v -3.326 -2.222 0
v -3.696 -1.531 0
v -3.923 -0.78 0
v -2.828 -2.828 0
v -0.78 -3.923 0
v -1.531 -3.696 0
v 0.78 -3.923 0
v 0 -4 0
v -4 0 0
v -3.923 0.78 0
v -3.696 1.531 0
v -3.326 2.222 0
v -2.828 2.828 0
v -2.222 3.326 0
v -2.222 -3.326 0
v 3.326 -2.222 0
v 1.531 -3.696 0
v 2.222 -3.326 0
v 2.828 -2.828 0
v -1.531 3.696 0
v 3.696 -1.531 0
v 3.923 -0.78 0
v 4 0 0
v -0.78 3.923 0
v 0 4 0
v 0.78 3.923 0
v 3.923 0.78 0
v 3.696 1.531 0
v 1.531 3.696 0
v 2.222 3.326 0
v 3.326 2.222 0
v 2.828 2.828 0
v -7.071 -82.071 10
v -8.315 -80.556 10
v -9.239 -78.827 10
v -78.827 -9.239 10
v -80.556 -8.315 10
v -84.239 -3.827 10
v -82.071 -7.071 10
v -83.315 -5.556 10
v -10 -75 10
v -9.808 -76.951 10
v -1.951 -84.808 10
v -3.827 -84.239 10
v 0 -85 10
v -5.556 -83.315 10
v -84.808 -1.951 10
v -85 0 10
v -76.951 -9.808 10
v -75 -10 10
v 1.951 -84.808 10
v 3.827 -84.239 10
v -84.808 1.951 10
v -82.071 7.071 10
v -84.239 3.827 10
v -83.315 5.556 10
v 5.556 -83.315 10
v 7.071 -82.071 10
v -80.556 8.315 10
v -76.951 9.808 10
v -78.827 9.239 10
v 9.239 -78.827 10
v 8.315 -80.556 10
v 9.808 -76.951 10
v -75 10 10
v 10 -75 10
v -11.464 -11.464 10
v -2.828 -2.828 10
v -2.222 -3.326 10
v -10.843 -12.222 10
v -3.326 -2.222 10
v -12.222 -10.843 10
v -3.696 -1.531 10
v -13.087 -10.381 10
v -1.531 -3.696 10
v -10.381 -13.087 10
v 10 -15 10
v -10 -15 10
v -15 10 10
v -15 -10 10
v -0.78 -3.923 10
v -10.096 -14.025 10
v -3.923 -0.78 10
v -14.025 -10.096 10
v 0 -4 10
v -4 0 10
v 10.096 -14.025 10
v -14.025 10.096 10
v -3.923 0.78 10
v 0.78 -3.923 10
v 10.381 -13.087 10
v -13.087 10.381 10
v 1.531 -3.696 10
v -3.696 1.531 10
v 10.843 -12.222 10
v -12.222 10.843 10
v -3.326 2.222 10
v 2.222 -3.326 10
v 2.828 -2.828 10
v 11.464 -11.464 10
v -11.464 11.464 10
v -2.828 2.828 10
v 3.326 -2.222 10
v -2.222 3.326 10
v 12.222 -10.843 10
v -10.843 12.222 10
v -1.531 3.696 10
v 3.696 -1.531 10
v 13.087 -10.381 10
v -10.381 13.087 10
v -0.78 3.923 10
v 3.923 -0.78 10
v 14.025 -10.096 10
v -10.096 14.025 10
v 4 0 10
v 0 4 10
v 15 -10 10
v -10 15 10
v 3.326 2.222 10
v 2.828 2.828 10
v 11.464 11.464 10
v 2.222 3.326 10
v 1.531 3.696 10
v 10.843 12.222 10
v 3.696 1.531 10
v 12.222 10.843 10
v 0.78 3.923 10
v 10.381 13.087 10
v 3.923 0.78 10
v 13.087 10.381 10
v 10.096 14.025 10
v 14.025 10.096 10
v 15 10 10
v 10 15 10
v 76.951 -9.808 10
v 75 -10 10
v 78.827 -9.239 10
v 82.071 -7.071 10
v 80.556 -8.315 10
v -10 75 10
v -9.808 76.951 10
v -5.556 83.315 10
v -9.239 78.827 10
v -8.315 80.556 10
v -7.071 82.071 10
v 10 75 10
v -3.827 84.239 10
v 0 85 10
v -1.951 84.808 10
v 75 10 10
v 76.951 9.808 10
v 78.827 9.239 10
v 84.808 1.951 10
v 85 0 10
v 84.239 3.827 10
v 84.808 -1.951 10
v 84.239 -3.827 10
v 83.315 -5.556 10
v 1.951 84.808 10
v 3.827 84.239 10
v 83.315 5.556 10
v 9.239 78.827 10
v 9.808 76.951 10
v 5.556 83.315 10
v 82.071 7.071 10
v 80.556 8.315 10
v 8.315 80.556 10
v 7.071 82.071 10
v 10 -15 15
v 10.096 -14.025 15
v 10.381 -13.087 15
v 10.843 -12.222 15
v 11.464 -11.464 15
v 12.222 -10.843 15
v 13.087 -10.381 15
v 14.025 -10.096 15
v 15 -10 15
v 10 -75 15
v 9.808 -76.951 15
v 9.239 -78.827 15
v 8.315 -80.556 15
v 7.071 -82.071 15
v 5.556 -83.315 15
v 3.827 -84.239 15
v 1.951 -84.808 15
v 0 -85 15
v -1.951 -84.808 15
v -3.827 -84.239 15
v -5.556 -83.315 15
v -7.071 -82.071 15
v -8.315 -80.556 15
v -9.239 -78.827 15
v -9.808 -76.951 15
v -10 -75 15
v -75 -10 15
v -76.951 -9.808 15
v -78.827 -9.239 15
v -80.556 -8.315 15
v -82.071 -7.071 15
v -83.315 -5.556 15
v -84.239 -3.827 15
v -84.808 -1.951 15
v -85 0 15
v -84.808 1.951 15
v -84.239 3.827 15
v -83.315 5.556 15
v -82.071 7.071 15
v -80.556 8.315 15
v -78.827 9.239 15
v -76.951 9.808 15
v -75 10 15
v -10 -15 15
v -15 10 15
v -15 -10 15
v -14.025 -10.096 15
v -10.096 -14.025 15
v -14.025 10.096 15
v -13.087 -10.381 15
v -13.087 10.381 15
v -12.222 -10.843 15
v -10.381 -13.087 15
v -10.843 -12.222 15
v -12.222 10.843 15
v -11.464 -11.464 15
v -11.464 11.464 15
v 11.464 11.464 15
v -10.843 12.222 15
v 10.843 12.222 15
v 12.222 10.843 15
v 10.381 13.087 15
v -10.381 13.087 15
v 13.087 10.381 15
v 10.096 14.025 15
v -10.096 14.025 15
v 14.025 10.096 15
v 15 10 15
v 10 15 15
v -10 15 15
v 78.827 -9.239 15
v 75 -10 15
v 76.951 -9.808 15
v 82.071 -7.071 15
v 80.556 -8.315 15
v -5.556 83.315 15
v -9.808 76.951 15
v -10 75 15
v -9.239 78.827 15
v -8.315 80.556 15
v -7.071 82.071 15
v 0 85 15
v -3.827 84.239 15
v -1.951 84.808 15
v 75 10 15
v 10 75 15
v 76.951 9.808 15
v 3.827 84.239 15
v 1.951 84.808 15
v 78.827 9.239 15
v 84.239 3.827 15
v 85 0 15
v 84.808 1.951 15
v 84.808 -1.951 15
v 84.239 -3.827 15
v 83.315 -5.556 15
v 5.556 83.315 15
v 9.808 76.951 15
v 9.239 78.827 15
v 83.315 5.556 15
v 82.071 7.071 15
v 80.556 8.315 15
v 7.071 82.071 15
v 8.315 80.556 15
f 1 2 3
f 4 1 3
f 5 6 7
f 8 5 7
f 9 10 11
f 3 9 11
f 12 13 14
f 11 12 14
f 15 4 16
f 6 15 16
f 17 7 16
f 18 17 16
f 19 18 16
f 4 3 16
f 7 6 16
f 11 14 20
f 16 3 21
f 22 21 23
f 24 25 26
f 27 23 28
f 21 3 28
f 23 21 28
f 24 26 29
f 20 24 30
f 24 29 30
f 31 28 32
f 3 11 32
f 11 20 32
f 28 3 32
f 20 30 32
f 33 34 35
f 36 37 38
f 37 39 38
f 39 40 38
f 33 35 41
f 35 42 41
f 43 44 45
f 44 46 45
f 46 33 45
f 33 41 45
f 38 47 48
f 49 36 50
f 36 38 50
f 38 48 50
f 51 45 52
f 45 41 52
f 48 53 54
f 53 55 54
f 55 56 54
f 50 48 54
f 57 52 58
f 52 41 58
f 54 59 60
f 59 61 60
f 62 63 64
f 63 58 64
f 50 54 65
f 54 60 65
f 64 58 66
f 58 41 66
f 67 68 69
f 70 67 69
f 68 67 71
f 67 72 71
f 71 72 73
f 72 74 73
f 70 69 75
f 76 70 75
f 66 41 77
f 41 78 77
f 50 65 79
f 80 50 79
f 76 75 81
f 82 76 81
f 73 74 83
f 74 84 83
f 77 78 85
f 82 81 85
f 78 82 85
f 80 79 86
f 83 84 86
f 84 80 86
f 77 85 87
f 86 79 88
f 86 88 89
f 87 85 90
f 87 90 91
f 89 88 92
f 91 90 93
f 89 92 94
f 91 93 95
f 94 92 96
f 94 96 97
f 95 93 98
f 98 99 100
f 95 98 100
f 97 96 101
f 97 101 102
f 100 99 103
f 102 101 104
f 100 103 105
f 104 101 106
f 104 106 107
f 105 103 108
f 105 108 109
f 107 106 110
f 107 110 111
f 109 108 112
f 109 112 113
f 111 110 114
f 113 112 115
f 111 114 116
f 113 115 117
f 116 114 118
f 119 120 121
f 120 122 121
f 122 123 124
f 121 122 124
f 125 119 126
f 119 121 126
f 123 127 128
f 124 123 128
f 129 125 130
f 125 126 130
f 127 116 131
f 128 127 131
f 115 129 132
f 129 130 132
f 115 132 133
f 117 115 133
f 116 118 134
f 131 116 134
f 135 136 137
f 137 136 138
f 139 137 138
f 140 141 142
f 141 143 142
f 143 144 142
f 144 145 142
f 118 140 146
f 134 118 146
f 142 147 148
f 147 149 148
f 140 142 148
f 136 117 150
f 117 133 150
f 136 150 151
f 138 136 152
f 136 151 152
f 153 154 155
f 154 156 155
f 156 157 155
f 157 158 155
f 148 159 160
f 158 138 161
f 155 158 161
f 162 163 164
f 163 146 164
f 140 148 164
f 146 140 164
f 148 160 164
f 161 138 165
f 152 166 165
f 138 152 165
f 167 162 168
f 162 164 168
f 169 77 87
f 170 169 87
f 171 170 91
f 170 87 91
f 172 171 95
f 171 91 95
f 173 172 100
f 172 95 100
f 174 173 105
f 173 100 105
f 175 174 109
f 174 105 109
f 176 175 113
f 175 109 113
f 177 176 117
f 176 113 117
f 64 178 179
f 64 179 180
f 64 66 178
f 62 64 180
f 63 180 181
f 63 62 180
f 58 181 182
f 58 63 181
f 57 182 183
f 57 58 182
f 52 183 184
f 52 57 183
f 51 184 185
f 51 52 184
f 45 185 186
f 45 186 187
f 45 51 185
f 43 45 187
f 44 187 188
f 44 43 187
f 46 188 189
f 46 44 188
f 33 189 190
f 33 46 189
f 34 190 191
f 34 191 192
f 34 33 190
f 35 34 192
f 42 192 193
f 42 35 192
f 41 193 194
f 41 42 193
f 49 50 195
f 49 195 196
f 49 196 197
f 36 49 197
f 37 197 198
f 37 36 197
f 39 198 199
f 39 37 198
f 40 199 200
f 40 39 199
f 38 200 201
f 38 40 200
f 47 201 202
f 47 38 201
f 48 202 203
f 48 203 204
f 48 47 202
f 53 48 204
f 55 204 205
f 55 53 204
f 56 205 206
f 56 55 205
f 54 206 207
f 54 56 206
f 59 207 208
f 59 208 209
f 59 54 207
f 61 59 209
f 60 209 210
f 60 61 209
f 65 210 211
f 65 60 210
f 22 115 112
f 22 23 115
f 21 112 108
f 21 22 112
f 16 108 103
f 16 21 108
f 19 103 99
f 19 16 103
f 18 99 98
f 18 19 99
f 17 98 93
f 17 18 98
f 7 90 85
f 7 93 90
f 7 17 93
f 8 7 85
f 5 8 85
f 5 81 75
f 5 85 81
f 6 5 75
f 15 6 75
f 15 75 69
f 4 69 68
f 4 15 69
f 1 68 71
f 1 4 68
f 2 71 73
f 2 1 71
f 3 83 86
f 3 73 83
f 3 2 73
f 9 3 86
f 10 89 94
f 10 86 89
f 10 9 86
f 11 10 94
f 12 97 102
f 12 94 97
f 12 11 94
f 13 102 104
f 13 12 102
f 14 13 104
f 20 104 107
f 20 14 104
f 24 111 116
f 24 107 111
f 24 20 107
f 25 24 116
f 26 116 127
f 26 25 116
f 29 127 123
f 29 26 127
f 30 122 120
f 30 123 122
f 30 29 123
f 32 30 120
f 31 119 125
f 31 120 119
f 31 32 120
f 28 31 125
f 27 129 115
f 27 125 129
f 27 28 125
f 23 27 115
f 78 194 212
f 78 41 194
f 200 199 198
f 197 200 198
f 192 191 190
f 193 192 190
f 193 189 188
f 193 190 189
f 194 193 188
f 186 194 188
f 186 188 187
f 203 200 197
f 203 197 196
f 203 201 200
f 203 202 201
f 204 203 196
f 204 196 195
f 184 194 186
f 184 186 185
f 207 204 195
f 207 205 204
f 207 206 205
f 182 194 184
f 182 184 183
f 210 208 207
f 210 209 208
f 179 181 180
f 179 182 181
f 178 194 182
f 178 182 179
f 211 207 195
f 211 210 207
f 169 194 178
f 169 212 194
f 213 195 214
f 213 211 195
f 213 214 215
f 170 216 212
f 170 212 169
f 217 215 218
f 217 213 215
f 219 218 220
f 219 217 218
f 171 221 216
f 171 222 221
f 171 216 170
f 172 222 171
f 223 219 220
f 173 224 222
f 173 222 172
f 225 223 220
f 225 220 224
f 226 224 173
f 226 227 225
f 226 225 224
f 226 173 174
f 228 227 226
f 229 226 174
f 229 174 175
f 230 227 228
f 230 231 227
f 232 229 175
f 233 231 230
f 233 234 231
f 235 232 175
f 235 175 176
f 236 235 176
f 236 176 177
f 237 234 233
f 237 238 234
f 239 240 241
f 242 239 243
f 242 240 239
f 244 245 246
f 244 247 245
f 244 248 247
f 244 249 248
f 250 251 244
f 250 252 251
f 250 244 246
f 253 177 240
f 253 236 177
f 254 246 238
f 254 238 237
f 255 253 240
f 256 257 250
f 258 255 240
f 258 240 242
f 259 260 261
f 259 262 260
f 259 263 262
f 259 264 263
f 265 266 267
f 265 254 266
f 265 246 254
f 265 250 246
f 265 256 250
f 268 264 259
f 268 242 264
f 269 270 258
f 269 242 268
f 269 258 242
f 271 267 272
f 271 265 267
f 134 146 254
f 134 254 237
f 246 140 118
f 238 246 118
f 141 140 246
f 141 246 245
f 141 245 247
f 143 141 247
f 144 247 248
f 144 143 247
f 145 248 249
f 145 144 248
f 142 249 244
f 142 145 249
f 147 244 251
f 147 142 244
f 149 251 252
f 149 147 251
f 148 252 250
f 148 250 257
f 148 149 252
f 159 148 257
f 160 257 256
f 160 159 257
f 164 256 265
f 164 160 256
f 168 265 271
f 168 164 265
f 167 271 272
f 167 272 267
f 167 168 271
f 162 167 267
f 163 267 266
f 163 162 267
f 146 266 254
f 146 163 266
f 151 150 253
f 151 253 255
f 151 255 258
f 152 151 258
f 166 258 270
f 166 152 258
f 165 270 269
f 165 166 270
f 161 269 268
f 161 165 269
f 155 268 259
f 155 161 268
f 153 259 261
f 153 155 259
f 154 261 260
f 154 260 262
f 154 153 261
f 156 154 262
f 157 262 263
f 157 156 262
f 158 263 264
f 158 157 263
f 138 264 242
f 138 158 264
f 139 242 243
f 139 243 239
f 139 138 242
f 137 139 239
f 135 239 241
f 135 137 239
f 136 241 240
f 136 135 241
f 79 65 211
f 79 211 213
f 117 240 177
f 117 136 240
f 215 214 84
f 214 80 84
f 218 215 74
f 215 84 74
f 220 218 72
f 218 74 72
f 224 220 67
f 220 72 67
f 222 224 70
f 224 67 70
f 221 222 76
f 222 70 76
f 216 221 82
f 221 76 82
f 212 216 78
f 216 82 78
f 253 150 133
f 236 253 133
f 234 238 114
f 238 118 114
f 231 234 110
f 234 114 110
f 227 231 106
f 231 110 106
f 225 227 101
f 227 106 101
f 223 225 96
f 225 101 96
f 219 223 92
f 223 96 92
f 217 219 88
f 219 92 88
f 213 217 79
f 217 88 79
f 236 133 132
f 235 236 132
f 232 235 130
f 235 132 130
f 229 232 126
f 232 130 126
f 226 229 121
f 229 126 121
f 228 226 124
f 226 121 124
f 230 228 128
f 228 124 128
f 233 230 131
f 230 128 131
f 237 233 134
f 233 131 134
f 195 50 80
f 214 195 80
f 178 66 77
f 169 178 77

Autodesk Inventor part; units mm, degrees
ref_plane "YZ Plane" through (0, 0, 0) normal (1, 0, 0) x (0, 1, 0)
ref_plane "XZ Plane" through (0, 0, 0) normal (0, 1, 0) x (-1, 0, 0)
ref_plane "XY Plane" through (0, 0, 0) normal (0, 0, 1) x (1, 0, 0)
sketch "Skizze1" plane through (0, 0, 0) normal (0, 0, 1) x (1, 0, 0)
  circle A0 centre (0, 0) radius 4
  dimension "d0" = 8
extrude "Extrusion1" add sketch "Skizze1" along normal blind 10
sketch "Skizze2" plane through (0, 0, 10) normal (0, 0, 1) x (1, 0, 0)
  circle A0 centre (0, 0) radius 4 projected
  line L0 (-75, 10) -> (-15, 10)
  arc A1 (-15, 10) -> (-10, 15) centre (-15, 15) ccw
  arc A2 (10, 75) -> (-10, 75) centre (0, 75) ccw
  line L1 (0, -121.8995) -> (0, 121.8995) projected
  line L2 (-10, 75) -> (-10, 15)
  line L3 (-121.8995, 0) -> (121.8995, 0) projected
  arc A3 (-75, 10) -> (-85, 0) centre (-75, 0) ccw
  circle A4 centre (0, 75) radius 3.05
  arc A5 (-10, -75) -> (0, -85) centre (0, -75) ccw
  line L4 (-10, -75) -> (-10, -15)
  arc A6 (-10, -15) -> (-15, -10) centre (-15, -15) ccw
  line L5 (-75, -10) -> (-15, -10)
  arc A7 (-75, 10) -> (-75, -10) centre (-75, 0) ccw
  circle A8 centre (-75, 0) radius 3.05
  arc A9 (75, -10) -> (85, 0) centre (75, 0) ccw
  line L6 (75, -10) -> (15, -10)
  arc A10 (15, -10) -> (10, -15) centre (15, -15) ccw
  line L7 (10, -75) -> (10, -15)
  arc A11 (-10, -75) -> (10, -75) centre (0, -75) ccw
  circle A12 centre (0, -75) radius 3.05
  arc A13 (10, 75) -> (0, 85) centre (0, 75) ccw
  line L8 (10, 75) -> (10, 15)
  arc A14 (10, 15) -> (15, 10) centre (15, 15) ccw
  line L9 (75, 10) -> (15, 10)
  arc A15 (75, -10) -> (75, 10) centre (75, 0) ccw
  circle A16 centre (75, 0) radius 3.05
  point P0 (-85, 0)
  point P1 (0, -85)
  point P2 (85, 0)
  point P3 (10, 75)
  dimension "d3" = 10
  dimension "d4" = 5
  dimension "d5" = 10
  dimension "d6" = 75
  dimension "d7" = 75
  dimension "d8" = 6.1
  dimension "d11" = 360
extrude "Extrusion2" add sketch "Skizze2" along normal blind 5 contours L3 L1 A0 | L3 A16 A9 L6 A10 L7 A11 L1 A12 A0 | A0 L1 L3 | A0 L1 A4 A2 L8 A14 L9 A15 L3 A16 | L1 L3 A0 | A0 L3 A8 A3 L0 A1 L2 A2 L1 A4 | L1 A12 A5 L4 A6 L5 A7 L3 A8 A0 | A0 L3 L1
sketch "Skizze3" plane through (0, 0, 15) normal (0, 0, 1) x (1, 0, 0)
  circle A0 centre (0, -75) radius 3.05 projected
  circle A1 centre (75, 0) radius 3.05 projected
  circle A2 centre (0, 75) radius 3.05 projected
  circle A3 centre (-75, 0) radius 3.05 projected
  point P0 (0, 0)
extrude "Extrusion3" add sketch "Skizze3" against normal up to surface (5 mm away)
properties part number "Adapter_Drehteller"
